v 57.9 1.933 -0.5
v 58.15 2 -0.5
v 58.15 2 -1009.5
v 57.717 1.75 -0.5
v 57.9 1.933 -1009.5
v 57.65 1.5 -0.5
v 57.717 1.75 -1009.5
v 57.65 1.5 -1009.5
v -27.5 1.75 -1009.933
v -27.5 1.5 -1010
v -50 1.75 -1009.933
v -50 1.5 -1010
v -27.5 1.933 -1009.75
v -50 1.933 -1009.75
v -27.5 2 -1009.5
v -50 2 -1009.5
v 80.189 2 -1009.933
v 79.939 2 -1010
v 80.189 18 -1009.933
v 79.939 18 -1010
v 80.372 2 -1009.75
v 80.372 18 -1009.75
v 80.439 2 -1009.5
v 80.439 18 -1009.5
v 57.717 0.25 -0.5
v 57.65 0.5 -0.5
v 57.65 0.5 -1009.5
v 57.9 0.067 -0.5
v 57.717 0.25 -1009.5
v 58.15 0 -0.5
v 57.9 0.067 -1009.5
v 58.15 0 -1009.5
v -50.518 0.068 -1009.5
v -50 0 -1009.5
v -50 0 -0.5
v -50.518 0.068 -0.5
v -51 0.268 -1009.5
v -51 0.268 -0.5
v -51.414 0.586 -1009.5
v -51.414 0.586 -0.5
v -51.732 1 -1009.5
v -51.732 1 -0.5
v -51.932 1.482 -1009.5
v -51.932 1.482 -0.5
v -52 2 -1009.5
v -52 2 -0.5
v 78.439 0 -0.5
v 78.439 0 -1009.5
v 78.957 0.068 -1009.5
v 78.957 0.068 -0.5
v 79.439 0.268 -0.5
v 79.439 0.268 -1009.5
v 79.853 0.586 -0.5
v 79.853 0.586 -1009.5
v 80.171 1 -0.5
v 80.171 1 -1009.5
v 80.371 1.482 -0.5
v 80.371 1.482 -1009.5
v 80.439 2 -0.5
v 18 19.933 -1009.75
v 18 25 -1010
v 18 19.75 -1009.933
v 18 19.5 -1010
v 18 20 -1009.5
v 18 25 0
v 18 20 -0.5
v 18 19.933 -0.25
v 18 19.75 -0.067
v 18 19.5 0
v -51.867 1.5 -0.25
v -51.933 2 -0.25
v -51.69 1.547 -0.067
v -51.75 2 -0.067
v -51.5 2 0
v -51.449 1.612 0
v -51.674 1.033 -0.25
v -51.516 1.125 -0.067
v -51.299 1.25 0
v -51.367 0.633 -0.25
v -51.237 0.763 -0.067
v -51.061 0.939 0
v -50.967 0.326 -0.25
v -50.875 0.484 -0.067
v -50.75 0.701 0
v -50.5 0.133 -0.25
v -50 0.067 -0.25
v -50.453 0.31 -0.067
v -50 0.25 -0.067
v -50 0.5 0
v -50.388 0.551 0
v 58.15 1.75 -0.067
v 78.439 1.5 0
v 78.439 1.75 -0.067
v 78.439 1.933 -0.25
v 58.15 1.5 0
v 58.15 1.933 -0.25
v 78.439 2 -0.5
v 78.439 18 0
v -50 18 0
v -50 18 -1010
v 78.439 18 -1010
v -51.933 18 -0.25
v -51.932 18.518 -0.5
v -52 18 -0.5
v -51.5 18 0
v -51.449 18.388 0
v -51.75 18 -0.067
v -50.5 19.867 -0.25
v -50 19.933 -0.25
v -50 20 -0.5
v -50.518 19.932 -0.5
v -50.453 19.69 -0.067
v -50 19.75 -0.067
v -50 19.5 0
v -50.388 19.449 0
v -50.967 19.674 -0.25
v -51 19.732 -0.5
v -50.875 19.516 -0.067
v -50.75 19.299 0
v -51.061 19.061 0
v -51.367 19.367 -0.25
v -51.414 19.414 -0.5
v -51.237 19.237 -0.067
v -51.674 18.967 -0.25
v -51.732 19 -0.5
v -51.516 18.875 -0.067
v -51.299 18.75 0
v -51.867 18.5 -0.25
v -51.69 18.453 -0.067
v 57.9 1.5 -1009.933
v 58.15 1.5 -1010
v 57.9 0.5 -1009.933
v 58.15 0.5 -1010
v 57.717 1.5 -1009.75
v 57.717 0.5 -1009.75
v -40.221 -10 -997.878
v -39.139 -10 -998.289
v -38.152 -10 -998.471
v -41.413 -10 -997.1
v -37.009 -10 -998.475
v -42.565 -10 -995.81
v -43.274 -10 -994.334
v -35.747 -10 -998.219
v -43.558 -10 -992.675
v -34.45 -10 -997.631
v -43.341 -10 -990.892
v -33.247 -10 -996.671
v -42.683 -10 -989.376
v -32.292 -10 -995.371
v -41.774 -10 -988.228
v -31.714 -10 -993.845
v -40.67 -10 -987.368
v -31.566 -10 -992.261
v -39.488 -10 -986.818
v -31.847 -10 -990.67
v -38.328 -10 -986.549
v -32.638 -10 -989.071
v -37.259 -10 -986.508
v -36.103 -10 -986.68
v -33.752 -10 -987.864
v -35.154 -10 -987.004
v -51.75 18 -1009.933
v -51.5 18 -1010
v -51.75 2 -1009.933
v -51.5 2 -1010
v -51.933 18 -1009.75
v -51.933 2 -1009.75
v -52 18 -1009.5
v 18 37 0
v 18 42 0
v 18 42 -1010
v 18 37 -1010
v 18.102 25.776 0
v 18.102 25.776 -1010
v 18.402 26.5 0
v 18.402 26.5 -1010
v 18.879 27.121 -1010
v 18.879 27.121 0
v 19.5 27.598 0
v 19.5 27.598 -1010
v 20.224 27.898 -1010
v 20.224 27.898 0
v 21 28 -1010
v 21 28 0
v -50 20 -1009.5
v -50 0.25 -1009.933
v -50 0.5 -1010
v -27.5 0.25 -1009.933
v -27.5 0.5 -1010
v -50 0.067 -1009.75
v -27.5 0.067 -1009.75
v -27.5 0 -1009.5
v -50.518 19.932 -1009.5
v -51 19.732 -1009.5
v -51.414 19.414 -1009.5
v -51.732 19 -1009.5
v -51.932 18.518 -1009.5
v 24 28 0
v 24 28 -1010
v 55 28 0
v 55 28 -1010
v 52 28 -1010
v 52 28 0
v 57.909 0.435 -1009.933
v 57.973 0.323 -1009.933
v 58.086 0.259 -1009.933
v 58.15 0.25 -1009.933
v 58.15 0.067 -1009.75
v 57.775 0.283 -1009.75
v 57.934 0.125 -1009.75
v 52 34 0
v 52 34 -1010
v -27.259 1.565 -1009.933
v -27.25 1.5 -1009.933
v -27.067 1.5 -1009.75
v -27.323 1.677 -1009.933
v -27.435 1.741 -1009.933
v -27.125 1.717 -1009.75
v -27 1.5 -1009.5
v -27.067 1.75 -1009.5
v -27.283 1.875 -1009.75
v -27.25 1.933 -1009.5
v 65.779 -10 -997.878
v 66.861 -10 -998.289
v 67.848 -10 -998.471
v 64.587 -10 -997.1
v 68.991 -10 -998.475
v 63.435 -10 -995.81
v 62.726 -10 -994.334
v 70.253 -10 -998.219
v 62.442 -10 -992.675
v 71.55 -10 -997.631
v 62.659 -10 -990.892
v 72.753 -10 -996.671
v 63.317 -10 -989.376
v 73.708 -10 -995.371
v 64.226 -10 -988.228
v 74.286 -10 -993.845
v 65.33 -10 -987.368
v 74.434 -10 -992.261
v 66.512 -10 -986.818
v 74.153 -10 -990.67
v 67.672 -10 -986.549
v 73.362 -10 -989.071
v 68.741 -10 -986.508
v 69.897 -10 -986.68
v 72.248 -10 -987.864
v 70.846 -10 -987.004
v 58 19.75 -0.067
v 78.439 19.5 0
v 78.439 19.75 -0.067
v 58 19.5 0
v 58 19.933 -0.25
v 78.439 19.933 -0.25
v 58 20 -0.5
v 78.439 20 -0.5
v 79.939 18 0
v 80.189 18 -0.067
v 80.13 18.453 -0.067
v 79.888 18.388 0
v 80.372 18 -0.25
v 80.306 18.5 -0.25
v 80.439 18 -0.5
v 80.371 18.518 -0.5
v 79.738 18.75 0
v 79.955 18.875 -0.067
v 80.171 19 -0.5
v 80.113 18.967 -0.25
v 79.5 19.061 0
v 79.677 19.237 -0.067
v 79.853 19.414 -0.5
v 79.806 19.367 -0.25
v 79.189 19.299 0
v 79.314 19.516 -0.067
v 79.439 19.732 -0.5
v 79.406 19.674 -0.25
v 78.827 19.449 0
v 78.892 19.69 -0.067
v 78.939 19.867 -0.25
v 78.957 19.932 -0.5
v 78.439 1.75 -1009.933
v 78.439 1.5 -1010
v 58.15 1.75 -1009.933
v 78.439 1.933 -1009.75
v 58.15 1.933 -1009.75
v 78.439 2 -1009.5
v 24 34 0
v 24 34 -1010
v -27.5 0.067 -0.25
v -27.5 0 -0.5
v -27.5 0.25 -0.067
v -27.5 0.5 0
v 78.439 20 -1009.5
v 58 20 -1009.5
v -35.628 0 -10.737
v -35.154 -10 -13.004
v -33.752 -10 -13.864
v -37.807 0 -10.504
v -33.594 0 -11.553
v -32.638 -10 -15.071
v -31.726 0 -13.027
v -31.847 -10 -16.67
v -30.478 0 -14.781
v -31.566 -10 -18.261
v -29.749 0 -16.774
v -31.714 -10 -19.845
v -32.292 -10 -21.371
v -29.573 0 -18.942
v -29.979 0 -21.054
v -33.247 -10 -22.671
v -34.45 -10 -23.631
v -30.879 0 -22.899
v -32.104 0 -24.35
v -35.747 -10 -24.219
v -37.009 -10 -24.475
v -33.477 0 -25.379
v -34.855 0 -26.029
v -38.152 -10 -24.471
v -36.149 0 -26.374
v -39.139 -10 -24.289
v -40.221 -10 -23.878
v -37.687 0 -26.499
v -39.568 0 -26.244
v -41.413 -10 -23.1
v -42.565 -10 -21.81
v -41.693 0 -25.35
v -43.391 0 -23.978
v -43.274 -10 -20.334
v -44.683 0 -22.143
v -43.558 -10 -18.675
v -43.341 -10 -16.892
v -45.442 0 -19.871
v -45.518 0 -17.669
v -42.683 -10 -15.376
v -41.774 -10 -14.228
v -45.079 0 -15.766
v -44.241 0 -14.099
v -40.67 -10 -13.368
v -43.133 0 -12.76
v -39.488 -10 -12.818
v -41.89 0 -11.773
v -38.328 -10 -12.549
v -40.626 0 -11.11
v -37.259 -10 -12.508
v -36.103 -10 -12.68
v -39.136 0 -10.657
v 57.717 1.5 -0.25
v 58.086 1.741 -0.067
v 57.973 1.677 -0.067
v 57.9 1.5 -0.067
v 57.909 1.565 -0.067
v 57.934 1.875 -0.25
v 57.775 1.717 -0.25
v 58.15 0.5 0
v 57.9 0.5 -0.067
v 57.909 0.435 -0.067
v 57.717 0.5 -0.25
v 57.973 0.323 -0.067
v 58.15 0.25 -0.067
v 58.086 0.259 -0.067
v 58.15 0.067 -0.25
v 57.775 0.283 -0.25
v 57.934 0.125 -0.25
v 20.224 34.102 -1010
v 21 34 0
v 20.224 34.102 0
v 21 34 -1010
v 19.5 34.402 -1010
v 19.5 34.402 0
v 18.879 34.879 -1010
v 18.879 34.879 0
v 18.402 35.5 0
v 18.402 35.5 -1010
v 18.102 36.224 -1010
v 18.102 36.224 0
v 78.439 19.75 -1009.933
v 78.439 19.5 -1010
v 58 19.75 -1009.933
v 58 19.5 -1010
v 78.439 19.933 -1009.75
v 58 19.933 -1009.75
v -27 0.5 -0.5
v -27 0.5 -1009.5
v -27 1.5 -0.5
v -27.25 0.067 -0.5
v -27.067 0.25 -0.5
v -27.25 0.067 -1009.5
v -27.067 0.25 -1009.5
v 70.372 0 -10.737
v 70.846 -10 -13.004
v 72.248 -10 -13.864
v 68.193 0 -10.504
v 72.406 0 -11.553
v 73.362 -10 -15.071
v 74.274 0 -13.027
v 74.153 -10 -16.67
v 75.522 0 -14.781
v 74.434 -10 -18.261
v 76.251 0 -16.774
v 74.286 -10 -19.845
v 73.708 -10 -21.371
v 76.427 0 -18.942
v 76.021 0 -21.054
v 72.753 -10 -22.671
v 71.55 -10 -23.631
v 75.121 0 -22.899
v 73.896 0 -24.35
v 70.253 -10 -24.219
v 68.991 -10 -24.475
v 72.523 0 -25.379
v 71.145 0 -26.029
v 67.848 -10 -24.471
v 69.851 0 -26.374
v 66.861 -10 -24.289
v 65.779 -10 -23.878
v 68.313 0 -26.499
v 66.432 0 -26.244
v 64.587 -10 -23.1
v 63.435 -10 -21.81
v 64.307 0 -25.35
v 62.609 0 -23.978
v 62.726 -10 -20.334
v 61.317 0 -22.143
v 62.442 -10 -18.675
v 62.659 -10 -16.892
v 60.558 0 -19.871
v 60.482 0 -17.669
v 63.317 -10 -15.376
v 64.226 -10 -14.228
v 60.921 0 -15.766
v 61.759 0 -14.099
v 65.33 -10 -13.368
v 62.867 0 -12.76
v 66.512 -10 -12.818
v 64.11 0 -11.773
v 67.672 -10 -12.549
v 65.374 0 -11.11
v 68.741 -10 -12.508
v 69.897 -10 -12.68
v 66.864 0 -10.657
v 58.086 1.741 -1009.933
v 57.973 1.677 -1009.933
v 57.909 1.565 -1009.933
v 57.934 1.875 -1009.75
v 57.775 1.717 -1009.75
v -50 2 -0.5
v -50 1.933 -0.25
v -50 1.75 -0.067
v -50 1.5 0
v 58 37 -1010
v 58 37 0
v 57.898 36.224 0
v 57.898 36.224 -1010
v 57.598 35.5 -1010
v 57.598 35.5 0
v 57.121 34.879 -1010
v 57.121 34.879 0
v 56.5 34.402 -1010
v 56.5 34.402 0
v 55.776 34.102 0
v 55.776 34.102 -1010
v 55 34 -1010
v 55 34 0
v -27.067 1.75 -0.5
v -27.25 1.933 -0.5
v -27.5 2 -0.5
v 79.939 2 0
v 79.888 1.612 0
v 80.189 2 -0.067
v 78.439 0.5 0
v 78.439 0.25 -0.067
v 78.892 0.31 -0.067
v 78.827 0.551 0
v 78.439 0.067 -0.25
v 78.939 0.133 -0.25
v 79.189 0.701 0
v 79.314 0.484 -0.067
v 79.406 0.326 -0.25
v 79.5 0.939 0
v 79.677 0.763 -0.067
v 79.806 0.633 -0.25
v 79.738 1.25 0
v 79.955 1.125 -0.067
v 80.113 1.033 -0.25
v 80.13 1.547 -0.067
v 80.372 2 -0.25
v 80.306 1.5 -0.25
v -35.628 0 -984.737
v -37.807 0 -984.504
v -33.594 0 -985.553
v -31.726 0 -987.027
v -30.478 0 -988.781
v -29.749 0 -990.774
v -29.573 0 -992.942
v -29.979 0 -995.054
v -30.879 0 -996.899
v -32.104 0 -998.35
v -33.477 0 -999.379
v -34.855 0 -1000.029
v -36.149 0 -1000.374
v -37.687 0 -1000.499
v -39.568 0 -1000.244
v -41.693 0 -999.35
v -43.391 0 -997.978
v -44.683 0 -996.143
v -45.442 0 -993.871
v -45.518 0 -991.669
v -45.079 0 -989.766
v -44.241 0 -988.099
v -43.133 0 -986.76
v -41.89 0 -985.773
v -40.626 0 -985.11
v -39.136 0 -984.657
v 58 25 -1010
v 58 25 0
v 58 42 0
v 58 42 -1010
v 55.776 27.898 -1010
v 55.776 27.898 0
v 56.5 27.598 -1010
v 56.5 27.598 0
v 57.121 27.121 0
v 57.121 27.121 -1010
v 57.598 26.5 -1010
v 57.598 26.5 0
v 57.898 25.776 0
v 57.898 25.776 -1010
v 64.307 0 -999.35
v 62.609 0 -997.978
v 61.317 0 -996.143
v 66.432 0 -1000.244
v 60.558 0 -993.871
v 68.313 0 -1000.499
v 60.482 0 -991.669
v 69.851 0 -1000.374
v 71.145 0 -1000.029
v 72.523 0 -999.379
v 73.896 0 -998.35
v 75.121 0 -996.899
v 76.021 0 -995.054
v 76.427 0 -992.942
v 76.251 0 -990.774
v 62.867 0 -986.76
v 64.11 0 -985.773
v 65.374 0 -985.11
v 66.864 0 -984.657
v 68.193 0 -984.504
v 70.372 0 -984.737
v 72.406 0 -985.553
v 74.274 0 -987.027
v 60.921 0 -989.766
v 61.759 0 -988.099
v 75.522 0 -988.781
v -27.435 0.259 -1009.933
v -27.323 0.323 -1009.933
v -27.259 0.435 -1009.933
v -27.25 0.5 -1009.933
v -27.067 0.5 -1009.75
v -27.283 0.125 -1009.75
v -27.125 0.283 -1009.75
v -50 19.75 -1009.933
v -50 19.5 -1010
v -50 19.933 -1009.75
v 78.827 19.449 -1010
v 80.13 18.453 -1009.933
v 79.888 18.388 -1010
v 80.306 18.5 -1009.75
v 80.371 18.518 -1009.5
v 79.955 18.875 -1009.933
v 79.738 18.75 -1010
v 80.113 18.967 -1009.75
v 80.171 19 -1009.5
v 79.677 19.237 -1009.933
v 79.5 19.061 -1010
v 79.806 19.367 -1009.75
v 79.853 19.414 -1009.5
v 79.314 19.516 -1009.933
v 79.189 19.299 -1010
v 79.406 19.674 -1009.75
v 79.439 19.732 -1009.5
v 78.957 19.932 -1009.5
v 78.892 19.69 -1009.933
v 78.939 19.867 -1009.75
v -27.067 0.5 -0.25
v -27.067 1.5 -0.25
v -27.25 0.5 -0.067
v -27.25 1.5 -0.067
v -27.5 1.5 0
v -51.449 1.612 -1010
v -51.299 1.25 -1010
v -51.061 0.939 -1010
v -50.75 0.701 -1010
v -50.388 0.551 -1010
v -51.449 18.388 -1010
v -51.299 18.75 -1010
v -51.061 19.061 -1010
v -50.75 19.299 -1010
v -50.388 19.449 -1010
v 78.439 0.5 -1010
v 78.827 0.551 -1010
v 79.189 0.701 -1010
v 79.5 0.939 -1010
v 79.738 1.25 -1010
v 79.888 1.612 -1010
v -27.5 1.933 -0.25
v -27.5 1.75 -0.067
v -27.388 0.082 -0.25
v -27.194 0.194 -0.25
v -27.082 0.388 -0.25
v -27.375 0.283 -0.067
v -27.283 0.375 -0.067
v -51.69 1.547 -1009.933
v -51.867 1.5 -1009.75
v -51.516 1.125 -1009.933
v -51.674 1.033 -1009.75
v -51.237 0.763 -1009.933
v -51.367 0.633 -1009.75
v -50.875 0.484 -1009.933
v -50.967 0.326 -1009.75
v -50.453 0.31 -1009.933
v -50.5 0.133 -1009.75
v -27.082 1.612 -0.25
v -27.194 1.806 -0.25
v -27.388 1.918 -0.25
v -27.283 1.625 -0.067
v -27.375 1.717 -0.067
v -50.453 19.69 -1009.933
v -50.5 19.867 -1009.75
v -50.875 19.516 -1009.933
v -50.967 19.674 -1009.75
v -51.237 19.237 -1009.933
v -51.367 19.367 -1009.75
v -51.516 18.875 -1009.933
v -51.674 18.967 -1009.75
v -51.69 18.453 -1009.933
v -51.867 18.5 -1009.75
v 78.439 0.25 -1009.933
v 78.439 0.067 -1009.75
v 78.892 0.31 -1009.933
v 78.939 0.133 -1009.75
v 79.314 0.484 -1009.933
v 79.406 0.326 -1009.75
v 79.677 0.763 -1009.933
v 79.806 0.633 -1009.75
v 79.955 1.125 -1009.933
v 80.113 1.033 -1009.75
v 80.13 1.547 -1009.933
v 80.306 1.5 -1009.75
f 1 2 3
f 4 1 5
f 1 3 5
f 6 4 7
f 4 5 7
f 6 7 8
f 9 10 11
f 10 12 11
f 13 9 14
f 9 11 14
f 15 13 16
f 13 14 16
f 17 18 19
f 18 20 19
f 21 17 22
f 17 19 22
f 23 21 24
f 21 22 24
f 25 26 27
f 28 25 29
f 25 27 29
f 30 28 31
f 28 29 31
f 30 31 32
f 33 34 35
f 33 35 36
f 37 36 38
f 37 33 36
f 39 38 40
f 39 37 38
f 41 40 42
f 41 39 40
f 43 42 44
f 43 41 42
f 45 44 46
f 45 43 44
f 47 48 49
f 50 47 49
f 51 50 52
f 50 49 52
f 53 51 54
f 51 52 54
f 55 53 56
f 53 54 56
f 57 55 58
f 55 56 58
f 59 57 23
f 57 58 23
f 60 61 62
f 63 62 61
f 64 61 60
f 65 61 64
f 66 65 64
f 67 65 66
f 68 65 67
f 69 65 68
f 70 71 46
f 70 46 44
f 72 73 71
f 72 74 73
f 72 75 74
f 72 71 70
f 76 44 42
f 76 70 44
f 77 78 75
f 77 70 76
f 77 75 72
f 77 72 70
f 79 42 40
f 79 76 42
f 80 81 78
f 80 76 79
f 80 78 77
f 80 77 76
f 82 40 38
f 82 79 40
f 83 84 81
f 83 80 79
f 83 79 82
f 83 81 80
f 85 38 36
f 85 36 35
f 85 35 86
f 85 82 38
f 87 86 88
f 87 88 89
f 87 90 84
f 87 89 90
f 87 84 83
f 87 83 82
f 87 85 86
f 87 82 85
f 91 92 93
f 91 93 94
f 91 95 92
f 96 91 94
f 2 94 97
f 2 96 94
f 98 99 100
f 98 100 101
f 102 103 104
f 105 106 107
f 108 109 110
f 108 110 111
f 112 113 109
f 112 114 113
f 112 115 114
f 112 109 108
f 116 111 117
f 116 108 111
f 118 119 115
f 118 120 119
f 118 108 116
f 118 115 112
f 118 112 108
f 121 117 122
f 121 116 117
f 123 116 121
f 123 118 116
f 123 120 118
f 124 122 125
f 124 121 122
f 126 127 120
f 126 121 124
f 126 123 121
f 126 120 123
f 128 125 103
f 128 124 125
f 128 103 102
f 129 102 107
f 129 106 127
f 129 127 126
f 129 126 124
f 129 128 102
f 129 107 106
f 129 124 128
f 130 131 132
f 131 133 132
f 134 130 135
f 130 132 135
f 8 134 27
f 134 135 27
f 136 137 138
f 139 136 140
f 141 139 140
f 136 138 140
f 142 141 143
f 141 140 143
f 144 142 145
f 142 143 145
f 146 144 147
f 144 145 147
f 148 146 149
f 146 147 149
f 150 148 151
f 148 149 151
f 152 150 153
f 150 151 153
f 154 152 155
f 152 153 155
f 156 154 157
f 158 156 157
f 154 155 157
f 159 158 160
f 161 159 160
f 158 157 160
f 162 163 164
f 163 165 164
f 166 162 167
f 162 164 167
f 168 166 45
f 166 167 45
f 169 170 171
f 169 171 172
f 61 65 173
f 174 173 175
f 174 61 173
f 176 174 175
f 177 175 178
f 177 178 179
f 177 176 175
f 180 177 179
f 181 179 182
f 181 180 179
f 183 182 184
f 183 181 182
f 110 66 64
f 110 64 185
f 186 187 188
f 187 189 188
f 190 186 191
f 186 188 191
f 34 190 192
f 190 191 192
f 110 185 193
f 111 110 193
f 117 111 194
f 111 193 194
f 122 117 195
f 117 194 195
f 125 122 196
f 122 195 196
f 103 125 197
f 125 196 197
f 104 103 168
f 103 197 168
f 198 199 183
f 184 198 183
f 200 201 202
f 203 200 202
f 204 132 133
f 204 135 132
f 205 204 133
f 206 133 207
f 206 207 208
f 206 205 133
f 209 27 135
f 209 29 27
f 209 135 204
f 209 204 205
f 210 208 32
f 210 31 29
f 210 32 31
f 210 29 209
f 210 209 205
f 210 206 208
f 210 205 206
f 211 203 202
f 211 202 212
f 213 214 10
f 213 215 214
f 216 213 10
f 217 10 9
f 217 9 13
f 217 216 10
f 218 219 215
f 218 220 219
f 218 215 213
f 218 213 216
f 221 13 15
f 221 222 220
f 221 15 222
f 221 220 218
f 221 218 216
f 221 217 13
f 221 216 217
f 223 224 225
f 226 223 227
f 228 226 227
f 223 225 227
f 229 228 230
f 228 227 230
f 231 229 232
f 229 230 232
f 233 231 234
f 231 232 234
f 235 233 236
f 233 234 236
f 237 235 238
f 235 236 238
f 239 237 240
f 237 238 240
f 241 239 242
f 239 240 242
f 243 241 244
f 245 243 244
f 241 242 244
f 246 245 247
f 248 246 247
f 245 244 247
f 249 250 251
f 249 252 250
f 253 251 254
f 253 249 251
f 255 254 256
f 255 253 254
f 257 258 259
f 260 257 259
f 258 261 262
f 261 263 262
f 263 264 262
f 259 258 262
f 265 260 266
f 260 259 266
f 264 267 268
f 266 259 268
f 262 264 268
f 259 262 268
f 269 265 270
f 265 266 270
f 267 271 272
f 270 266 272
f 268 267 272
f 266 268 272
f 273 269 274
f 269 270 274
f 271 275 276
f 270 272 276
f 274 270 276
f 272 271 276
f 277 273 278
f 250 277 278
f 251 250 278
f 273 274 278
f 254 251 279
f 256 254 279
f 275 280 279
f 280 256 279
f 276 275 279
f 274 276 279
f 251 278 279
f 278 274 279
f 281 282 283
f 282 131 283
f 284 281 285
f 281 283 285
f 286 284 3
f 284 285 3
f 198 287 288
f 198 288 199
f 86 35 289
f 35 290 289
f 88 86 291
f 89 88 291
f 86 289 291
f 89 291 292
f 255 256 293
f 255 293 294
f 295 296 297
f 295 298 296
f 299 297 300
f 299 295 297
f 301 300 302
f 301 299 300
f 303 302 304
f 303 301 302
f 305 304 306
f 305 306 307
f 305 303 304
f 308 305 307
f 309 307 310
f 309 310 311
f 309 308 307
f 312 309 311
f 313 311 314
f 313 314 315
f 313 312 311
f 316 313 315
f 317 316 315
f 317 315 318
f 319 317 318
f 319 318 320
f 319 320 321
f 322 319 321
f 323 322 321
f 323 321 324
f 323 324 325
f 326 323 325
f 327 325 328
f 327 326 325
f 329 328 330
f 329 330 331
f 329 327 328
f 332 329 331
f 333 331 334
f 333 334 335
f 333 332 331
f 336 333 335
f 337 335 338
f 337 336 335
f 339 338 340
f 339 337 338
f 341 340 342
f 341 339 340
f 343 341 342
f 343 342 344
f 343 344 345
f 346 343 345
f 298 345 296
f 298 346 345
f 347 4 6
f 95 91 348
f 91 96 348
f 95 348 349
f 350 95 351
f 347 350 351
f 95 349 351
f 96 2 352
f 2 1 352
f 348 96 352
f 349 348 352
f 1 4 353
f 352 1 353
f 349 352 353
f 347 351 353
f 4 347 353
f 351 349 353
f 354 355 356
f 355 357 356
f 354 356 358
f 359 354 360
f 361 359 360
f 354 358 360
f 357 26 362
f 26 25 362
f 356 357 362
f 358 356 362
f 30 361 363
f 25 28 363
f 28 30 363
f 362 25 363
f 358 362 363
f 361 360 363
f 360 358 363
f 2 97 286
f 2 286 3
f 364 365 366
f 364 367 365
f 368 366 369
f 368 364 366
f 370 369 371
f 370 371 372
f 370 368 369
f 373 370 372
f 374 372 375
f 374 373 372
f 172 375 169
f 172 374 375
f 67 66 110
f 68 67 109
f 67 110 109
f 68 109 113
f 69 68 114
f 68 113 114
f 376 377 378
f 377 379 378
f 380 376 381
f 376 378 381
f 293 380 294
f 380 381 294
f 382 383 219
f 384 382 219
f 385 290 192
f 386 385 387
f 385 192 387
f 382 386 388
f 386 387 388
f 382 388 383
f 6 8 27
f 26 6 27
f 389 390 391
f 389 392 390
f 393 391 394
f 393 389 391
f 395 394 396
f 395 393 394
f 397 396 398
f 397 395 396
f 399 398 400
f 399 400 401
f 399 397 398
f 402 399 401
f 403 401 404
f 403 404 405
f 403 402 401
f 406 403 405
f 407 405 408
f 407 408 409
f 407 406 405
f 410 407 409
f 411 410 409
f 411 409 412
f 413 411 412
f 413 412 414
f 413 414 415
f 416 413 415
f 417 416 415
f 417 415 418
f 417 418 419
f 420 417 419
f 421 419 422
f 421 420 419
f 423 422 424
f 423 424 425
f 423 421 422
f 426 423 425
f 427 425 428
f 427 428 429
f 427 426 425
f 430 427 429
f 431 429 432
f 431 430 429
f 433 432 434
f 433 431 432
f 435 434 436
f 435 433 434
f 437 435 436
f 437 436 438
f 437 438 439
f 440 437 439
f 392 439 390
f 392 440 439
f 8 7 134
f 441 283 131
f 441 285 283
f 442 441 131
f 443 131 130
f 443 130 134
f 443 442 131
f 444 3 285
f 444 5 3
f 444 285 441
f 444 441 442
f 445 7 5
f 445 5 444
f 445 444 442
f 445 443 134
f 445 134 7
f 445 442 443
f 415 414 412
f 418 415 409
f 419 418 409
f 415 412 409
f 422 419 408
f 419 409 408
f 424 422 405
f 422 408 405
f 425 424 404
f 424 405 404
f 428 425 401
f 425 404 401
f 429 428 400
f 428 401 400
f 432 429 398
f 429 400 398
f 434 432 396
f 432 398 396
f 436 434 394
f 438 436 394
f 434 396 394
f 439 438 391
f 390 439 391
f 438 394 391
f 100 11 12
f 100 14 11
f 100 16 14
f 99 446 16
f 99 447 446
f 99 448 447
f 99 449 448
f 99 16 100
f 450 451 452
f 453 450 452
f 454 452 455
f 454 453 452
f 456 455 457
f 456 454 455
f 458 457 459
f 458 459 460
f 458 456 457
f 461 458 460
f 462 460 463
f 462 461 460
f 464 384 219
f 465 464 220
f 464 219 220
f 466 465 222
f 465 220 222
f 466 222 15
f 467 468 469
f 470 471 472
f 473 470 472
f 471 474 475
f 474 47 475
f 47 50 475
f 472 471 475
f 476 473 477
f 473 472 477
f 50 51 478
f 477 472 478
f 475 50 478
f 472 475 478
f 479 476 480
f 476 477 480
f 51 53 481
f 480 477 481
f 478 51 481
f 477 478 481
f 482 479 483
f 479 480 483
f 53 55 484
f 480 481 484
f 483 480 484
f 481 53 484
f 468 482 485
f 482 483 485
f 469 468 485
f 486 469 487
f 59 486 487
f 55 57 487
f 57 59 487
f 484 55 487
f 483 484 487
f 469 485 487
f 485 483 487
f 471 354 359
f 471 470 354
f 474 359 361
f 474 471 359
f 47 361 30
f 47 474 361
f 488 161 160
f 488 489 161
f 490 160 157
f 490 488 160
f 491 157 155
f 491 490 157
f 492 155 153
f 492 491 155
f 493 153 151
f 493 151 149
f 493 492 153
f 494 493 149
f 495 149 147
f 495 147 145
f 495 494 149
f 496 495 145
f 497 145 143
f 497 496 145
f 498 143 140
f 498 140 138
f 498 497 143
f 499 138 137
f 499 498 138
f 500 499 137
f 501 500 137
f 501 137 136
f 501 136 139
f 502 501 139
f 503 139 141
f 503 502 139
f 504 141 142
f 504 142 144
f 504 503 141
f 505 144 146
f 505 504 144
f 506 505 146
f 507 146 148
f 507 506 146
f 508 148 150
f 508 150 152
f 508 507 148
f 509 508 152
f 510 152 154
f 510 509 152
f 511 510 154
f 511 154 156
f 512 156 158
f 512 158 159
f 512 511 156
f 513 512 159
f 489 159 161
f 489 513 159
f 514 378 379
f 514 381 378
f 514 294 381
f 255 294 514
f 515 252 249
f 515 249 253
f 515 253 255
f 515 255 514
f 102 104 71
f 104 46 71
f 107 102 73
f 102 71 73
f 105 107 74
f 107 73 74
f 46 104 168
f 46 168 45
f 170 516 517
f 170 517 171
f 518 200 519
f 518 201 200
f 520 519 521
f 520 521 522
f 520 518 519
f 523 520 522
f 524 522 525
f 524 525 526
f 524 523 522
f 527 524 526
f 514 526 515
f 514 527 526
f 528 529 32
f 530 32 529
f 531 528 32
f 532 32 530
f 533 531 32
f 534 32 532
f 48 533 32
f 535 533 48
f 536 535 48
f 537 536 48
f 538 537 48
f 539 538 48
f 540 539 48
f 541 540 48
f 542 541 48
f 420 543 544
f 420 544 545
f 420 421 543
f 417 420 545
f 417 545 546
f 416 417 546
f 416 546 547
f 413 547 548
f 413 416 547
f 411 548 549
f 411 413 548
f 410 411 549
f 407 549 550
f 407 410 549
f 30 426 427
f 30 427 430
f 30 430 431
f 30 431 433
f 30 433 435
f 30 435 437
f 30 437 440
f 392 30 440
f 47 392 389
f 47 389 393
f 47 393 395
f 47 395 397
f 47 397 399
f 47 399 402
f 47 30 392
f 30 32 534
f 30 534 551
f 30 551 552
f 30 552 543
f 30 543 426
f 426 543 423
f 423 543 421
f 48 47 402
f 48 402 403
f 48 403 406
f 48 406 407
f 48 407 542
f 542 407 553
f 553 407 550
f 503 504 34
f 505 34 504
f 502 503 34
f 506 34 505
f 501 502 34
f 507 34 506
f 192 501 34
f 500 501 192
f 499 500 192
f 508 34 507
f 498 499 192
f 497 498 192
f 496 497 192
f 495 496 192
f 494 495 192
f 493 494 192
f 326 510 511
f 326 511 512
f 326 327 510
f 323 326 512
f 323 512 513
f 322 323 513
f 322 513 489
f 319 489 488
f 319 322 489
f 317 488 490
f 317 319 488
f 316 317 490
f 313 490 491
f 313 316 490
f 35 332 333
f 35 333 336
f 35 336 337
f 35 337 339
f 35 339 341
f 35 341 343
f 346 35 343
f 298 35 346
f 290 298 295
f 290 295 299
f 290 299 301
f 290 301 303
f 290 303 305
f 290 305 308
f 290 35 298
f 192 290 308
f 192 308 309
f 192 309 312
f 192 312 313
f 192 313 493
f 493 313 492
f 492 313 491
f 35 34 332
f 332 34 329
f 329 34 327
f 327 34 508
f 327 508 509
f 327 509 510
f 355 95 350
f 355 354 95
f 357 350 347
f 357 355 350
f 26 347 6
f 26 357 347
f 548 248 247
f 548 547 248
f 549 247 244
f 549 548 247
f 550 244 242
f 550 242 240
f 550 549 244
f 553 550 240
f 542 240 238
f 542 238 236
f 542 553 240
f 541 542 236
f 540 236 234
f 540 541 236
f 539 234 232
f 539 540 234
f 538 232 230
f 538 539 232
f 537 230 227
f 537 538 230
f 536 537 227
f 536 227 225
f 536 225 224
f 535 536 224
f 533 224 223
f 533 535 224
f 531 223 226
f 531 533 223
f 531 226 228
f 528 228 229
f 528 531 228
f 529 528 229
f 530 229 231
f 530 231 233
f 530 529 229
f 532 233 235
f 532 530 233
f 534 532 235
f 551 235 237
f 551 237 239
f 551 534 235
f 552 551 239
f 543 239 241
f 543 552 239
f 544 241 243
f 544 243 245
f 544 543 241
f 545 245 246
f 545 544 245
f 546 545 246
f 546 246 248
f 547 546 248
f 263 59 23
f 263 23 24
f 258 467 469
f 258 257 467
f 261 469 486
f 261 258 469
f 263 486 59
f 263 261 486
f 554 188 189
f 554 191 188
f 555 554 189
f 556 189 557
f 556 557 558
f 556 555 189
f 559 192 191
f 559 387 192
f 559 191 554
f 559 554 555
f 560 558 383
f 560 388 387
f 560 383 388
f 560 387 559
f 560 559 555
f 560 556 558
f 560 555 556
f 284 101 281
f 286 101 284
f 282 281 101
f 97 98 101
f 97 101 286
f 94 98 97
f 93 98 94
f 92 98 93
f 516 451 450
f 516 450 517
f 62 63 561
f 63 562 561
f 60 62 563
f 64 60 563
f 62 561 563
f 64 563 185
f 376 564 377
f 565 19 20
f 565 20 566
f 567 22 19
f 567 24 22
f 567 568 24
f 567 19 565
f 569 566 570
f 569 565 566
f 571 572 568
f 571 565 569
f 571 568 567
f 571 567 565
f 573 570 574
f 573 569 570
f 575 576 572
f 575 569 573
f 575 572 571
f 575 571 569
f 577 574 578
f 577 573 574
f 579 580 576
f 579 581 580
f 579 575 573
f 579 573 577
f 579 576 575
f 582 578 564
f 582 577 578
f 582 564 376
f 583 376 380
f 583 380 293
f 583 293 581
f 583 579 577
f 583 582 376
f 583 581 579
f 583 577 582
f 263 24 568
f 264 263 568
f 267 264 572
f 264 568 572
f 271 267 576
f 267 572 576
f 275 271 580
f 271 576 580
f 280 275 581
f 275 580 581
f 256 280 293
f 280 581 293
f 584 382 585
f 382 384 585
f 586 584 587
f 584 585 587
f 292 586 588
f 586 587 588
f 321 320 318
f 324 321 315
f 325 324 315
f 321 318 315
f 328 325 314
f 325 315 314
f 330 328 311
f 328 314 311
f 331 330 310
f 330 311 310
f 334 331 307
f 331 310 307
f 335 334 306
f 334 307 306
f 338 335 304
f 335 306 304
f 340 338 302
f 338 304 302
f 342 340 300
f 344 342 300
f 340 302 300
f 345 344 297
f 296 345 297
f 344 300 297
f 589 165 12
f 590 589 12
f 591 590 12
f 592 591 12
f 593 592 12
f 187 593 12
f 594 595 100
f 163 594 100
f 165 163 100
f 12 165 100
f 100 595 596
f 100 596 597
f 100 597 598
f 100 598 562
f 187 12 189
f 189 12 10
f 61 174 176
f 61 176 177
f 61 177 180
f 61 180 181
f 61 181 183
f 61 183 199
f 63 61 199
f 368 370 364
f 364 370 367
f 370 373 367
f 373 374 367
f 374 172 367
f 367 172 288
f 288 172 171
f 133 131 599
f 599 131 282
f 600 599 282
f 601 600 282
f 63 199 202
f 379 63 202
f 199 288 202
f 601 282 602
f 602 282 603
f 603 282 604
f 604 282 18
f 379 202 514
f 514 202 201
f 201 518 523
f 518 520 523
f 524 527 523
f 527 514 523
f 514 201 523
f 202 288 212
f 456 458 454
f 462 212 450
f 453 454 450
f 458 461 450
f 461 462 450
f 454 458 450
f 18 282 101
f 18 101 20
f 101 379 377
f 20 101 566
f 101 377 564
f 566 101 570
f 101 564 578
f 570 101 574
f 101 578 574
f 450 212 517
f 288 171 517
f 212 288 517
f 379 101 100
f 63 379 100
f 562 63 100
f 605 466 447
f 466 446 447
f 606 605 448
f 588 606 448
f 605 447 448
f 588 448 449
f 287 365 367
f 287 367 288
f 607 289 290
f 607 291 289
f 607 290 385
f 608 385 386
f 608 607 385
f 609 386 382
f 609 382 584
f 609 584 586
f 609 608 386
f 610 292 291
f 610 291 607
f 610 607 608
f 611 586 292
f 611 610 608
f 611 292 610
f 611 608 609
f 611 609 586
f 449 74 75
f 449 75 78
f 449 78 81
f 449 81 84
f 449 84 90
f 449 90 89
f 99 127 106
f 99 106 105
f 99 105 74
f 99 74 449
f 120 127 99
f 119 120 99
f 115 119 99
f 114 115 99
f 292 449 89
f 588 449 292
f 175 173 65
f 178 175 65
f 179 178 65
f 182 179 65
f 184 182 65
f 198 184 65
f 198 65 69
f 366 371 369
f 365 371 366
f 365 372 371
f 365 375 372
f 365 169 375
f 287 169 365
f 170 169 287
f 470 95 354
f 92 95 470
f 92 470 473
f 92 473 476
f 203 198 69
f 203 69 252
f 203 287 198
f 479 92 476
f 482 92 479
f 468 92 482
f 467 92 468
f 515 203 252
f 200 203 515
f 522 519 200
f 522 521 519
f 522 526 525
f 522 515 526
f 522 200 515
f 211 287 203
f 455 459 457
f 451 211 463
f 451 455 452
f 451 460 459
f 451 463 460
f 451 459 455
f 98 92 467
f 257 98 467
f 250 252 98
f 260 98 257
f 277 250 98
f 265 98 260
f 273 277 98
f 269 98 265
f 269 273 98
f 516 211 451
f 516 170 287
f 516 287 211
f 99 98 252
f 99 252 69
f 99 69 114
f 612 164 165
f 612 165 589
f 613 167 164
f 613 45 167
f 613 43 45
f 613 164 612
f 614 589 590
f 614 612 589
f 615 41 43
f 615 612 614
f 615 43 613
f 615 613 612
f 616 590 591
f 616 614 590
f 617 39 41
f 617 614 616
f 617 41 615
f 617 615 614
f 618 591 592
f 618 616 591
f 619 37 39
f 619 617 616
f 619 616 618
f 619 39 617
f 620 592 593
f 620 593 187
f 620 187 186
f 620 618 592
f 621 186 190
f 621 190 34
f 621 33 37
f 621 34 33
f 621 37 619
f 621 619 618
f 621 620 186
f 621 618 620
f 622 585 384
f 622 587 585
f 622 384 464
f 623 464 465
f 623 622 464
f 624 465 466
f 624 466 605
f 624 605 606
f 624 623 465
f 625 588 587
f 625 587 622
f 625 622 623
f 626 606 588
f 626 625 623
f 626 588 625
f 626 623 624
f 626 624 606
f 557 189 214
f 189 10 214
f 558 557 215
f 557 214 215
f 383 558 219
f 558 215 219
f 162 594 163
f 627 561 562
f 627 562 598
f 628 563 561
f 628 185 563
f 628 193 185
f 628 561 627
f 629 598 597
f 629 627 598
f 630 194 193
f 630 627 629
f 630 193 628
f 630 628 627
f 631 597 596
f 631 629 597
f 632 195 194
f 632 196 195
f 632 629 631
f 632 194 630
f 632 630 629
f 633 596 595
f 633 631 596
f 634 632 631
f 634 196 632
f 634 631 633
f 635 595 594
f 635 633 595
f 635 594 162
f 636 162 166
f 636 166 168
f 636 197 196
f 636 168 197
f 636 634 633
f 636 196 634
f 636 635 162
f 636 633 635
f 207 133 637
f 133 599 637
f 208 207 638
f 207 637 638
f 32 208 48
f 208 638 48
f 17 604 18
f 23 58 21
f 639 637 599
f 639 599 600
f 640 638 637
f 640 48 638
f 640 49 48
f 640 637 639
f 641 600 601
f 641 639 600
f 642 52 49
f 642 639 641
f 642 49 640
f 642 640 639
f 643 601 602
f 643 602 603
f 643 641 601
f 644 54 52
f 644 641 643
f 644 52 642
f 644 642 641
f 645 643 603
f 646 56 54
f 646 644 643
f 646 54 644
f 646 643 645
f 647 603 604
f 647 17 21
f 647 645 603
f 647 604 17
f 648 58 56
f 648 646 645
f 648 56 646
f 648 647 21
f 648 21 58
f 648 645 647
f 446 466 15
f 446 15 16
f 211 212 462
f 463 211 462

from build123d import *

# Parameters (mm, degrees)
EXTRUDE_1_DEPTH = 1010
FILLET_1_R      = 2
FILLET_2_R      = 0.5
FILLET_3_R      = 0.5
FILLET_4_R      = 3


with BuildPart() as part:
    # 草图1 → 凸台-拉伸1 (new body)
    with BuildSketch(Plane.XY):
        Polygon((-52, 0), (-27, 0), (-27, 2), (-50, 2), (-50, 18), (78.43916289, 18), (78.43916289, 2), (57.650269721, 2), (57.650269721, 0), (80.43916289, 0), (80.43916289, 20), (58, 20), (58, 28), (52, 28), (52, 34), (58, 34), (58, 42), (18, 42), (18, 34), (24, 34), (24, 28), (18, 28), (18, 20), (-52, 20), align=None)
    extrude(amount=-EXTRUDE_1_DEPTH)

    # 圆角1
    fillet_1_edges = [part.edges().sort_by_distance(p)[0] for p in [
        (80.43916289, 20, -505),
        (80.43916289, 0, -505),
        (-52, 0, -505),
        (-52, 20, -505),
    ]]
    fillet(fillet_1_edges, radius=FILLET_1_R)

    # 圆角2
    fillet_2_edges = [part.edges().sort_by_distance(p)[0] for p in [
        (57.650269721, 0, -505),
        (57.650269721, 2, -505),
        (-27, 2, -505),
        (-27, 0, -505),
    ]]
    fillet(fillet_2_edges, radius=FILLET_2_R)

    # 圆角3
    fillet_3_edges = [part.edges().sort_by_distance(p)[0] for p in [
        (57.650269721, 1, 0),
        (57.650269721, 1, -1010),
        (-38.75, 0, 0),
        (-27, 1, 0),
        (-38.75, 2, 0),
        (-27.146446609, 1.853553391, 0),
        (-27.146446609, 0.146446609, 0),
        (57.79671633, 1.853553391, 0),
        (57.79671633, 0.146446609, 0),
        (-38.75, 2, -1010),
        (-27, 1, -1010),
        (-38.75, 0, -1010),
        (-27.146446609, 1.853553391, -1010),
        (-27.146446609, 0.146446609, -1010),
        (57.79671633, 1.853553391, -1010),
        (57.79671633, 0.146446609, -1010),
        (68.294716305, 2, -1010),
        (68.219581445, 20, -1010),
        (68.294716305, 2, 0),
        (68.219581445, 20, 0),
        (68.294716305, 0, 0),
        (68.294716305, 0, -1010),
        (-16, 20, 0),
        (-52, 10, 0),
        (80.43916289, 10, 0),
        (-51.414213562, 19.414213562, 0),
        (-51.414213562, 0.585786438, 0),
        (79.853376452, 19.414213562, 0),
        (79.853376452, 0.585786438, 0),
        (80.43916289, 10, -1010),
        (-52, 10, -1010),
        (-16, 20, -1010),
        (-51.414213562, 19.414213562, -1010),
        (-51.414213562, 0.585786438, -1010),
        (79.853376452, 19.414213562, -1010),
        (79.853376452, 0.585786438, -1010),
    ]]
    fillet(fillet_3_edges, radius=FILLET_3_R)

    # 圆角4
    fillet_4_edges = [part.edges().sort_by_distance(p)[0] for p in [
        (58, 34, -505),
        (58, 28, -505),
        (18, 28, -505),
        (18, 34, -505),
    ]]
    fillet(fillet_4_edges, radius=FILLET_4_R)

    # 放样1: read off the stored shape, not the designer's step
    # 放样1: loft between two sections, ruled curve by curve
    loft_1_from = [
        Edge.make_bspline([(70.846246082, -10, -13.004005958), (81.838234165, -10, -17.818172342), (77.024067781, -10, -28.810160426), (66.032079698, -10, -23.995994042), (55.040091614, -10, -19.181827658), (59.854257998, -10, -8.189839574), (70.846246082, -10, -13.004005958)], [0, 0, 0, 0, 0.5, 0.5, 0.5, 1, 1, 1, 1], 3, [1, 0.333333333, 0.333333333, 1, 0.333333333, 0.333333333, 1]),
    ]
    loft_1_to = [
        Edge.make_bspline([(68.192900935, 0, -10.503791208), (84.185318519, 0, -10.011267297), (84.67784243, 0, -26.003684881), (68.685424845, 0, -26.496208792), (52.693007261, 0, -26.988732703), (52.20048335, 0, -10.996315119), (68.192900935, 0, -10.503791208)], [0, 0, 0, 0, 0.5, 0.5, 0.5, 1, 1, 1, 1], 3, [1, 0.333333333, 0.333333333, 1, 0.333333333, 0.333333333, 1]),
    ]
    loft_1 = Solid(Shell([*[Face.make_surface_from_curves(loft_1_from[k], loft_1_to[k]) for k in range(1)], Face(Wire(loft_1_from)), Face(Wire(loft_1_to))]))
    add(loft_1)

    # 阵列(线性)1: read off the stored shape, not the designer's step
    # 阵列(线性)1: loft between two sections, ruled curve by curve
    pattern_linear_1_from = [
        Edge.make_bspline([(70.846246082, -10, -987.004005958), (81.838234165, -10, -991.818172342), (77.024067781, -10, -1002.810160426), (66.032079698, -10, -997.995994042), (55.040091614, -10, -993.181827658), (59.854257998, -10, -982.189839574), (70.846246082, -10, -987.004005958)], [0, 0, 0, 0, 0.5, 0.5, 0.5, 1, 1, 1, 1], 3, [1, 0.333333333, 0.333333333, 1, 0.333333333, 0.333333333, 1]),
    ]
    pattern_linear_1_to = [
        Edge.make_bspline([(68.192900935, 0, -984.503791208), (84.185318519, 0, -984.011267297), (84.67784243, 0, -1000.003684881), (68.685424845, 0, -1000.496208792), (52.693007261, 0, -1000.988732703), (52.20048335, 0, -984.996315119), (68.192900935, 0, -984.503791208)], [0, 0, 0, 0, 0.5, 0.5, 0.5, 1, 1, 1, 1], 3, [1, 0.333333333, 0.333333333, 1, 0.333333333, 0.333333333, 1]),
    ]
    pattern_linear_1 = Solid(Shell([*[Face.make_surface_from_curves(pattern_linear_1_from[k], pattern_linear_1_to[k]) for k in range(1)], Face(Wire(pattern_linear_1_from)), Face(Wire(pattern_linear_1_to))]))
    add(pattern_linear_1)

    # Pattern Linear 1 2: loft between two sections, ruled curve by curve
    pattern_linear_1_2_from = [
        Edge.make_bspline([(-35.153753918, -10, -13.004005958), (-24.161765835, -10, -17.818172342), (-28.975932219, -10, -28.810160426), (-39.967920302, -10, -23.995994042), (-50.959908386, -10, -19.181827658), (-46.145742002, -10, -8.189839574), (-35.153753918, -10, -13.004005958)], [0, 0, 0, 0, 0.5, 0.5, 0.5, 1, 1, 1, 1], 3, [1, 0.333333333, 0.333333333, 1, 0.333333333, 0.333333333, 1]),
    ]
    pattern_linear_1_2_to = [
        Edge.make_bspline([(-37.807099065, 0, -10.503791208), (-21.814681481, 0, -10.011267297), (-21.32215757, 0, -26.003684881), (-37.314575155, 0, -26.496208792), (-53.306992739, 0, -26.988732703), (-53.79951665, 0, -10.996315119), (-37.807099065, 0, -10.503791208)], [0, 0, 0, 0, 0.5, 0.5, 0.5, 1, 1, 1, 1], 3, [1, 0.333333333, 0.333333333, 1, 0.333333333, 0.333333333, 1]),
    ]
    pattern_linear_1_2 = Solid(Shell([*[Face.make_surface_from_curves(pattern_linear_1_2_from[k], pattern_linear_1_2_to[k]) for k in range(1)], Face(Wire(pattern_linear_1_2_from)), Face(Wire(pattern_linear_1_2_to))]))
    add(pattern_linear_1_2)

    # Pattern Linear 1 3: loft between two sections, ruled curve by curve
    pattern_linear_1_3_from = [
        Edge.make_bspline([(-35.153753918, -10, -987.004005958), (-24.161765835, -10, -991.818172342), (-28.975932219, -10, -1002.810160426), (-39.967920302, -10, -997.995994042), (-50.959908386, -10, -993.181827658), (-46.145742002, -10, -982.189839574), (-35.153753918, -10, -987.004005958)], [0, 0, 0, 0, 0.5, 0.5, 0.5, 1, 1, 1, 1], 3, [1, 0.333333333, 0.333333333, 1, 0.333333333, 0.333333333, 1]),
    ]
    pattern_linear_1_3_to = [
        Edge.make_bspline([(-37.807099065, 0, -984.503791208), (-21.814681481, 0, -984.011267297), (-21.32215757, 0, -1000.003684881), (-37.314575155, 0, -1000.496208792), (-53.306992739, 0, -1000.988732703), (-53.79951665, 0, -984.996315119), (-37.807099065, 0, -984.503791208)], [0, 0, 0, 0, 0.5, 0.5, 0.5, 1, 1, 1, 1], 3, [1, 0.333333333, 0.333333333, 1, 0.333333333, 0.333333333, 1]),
    ]
    pattern_linear_1_3 = Solid(Shell([*[Face.make_surface_from_curves(pattern_linear_1_3_from[k], pattern_linear_1_3_to[k]) for k in range(1)], Face(Wire(pattern_linear_1_3_from)), Face(Wire(pattern_linear_1_3_to))]))
    add(pattern_linear_1_3)


solid = part.part
